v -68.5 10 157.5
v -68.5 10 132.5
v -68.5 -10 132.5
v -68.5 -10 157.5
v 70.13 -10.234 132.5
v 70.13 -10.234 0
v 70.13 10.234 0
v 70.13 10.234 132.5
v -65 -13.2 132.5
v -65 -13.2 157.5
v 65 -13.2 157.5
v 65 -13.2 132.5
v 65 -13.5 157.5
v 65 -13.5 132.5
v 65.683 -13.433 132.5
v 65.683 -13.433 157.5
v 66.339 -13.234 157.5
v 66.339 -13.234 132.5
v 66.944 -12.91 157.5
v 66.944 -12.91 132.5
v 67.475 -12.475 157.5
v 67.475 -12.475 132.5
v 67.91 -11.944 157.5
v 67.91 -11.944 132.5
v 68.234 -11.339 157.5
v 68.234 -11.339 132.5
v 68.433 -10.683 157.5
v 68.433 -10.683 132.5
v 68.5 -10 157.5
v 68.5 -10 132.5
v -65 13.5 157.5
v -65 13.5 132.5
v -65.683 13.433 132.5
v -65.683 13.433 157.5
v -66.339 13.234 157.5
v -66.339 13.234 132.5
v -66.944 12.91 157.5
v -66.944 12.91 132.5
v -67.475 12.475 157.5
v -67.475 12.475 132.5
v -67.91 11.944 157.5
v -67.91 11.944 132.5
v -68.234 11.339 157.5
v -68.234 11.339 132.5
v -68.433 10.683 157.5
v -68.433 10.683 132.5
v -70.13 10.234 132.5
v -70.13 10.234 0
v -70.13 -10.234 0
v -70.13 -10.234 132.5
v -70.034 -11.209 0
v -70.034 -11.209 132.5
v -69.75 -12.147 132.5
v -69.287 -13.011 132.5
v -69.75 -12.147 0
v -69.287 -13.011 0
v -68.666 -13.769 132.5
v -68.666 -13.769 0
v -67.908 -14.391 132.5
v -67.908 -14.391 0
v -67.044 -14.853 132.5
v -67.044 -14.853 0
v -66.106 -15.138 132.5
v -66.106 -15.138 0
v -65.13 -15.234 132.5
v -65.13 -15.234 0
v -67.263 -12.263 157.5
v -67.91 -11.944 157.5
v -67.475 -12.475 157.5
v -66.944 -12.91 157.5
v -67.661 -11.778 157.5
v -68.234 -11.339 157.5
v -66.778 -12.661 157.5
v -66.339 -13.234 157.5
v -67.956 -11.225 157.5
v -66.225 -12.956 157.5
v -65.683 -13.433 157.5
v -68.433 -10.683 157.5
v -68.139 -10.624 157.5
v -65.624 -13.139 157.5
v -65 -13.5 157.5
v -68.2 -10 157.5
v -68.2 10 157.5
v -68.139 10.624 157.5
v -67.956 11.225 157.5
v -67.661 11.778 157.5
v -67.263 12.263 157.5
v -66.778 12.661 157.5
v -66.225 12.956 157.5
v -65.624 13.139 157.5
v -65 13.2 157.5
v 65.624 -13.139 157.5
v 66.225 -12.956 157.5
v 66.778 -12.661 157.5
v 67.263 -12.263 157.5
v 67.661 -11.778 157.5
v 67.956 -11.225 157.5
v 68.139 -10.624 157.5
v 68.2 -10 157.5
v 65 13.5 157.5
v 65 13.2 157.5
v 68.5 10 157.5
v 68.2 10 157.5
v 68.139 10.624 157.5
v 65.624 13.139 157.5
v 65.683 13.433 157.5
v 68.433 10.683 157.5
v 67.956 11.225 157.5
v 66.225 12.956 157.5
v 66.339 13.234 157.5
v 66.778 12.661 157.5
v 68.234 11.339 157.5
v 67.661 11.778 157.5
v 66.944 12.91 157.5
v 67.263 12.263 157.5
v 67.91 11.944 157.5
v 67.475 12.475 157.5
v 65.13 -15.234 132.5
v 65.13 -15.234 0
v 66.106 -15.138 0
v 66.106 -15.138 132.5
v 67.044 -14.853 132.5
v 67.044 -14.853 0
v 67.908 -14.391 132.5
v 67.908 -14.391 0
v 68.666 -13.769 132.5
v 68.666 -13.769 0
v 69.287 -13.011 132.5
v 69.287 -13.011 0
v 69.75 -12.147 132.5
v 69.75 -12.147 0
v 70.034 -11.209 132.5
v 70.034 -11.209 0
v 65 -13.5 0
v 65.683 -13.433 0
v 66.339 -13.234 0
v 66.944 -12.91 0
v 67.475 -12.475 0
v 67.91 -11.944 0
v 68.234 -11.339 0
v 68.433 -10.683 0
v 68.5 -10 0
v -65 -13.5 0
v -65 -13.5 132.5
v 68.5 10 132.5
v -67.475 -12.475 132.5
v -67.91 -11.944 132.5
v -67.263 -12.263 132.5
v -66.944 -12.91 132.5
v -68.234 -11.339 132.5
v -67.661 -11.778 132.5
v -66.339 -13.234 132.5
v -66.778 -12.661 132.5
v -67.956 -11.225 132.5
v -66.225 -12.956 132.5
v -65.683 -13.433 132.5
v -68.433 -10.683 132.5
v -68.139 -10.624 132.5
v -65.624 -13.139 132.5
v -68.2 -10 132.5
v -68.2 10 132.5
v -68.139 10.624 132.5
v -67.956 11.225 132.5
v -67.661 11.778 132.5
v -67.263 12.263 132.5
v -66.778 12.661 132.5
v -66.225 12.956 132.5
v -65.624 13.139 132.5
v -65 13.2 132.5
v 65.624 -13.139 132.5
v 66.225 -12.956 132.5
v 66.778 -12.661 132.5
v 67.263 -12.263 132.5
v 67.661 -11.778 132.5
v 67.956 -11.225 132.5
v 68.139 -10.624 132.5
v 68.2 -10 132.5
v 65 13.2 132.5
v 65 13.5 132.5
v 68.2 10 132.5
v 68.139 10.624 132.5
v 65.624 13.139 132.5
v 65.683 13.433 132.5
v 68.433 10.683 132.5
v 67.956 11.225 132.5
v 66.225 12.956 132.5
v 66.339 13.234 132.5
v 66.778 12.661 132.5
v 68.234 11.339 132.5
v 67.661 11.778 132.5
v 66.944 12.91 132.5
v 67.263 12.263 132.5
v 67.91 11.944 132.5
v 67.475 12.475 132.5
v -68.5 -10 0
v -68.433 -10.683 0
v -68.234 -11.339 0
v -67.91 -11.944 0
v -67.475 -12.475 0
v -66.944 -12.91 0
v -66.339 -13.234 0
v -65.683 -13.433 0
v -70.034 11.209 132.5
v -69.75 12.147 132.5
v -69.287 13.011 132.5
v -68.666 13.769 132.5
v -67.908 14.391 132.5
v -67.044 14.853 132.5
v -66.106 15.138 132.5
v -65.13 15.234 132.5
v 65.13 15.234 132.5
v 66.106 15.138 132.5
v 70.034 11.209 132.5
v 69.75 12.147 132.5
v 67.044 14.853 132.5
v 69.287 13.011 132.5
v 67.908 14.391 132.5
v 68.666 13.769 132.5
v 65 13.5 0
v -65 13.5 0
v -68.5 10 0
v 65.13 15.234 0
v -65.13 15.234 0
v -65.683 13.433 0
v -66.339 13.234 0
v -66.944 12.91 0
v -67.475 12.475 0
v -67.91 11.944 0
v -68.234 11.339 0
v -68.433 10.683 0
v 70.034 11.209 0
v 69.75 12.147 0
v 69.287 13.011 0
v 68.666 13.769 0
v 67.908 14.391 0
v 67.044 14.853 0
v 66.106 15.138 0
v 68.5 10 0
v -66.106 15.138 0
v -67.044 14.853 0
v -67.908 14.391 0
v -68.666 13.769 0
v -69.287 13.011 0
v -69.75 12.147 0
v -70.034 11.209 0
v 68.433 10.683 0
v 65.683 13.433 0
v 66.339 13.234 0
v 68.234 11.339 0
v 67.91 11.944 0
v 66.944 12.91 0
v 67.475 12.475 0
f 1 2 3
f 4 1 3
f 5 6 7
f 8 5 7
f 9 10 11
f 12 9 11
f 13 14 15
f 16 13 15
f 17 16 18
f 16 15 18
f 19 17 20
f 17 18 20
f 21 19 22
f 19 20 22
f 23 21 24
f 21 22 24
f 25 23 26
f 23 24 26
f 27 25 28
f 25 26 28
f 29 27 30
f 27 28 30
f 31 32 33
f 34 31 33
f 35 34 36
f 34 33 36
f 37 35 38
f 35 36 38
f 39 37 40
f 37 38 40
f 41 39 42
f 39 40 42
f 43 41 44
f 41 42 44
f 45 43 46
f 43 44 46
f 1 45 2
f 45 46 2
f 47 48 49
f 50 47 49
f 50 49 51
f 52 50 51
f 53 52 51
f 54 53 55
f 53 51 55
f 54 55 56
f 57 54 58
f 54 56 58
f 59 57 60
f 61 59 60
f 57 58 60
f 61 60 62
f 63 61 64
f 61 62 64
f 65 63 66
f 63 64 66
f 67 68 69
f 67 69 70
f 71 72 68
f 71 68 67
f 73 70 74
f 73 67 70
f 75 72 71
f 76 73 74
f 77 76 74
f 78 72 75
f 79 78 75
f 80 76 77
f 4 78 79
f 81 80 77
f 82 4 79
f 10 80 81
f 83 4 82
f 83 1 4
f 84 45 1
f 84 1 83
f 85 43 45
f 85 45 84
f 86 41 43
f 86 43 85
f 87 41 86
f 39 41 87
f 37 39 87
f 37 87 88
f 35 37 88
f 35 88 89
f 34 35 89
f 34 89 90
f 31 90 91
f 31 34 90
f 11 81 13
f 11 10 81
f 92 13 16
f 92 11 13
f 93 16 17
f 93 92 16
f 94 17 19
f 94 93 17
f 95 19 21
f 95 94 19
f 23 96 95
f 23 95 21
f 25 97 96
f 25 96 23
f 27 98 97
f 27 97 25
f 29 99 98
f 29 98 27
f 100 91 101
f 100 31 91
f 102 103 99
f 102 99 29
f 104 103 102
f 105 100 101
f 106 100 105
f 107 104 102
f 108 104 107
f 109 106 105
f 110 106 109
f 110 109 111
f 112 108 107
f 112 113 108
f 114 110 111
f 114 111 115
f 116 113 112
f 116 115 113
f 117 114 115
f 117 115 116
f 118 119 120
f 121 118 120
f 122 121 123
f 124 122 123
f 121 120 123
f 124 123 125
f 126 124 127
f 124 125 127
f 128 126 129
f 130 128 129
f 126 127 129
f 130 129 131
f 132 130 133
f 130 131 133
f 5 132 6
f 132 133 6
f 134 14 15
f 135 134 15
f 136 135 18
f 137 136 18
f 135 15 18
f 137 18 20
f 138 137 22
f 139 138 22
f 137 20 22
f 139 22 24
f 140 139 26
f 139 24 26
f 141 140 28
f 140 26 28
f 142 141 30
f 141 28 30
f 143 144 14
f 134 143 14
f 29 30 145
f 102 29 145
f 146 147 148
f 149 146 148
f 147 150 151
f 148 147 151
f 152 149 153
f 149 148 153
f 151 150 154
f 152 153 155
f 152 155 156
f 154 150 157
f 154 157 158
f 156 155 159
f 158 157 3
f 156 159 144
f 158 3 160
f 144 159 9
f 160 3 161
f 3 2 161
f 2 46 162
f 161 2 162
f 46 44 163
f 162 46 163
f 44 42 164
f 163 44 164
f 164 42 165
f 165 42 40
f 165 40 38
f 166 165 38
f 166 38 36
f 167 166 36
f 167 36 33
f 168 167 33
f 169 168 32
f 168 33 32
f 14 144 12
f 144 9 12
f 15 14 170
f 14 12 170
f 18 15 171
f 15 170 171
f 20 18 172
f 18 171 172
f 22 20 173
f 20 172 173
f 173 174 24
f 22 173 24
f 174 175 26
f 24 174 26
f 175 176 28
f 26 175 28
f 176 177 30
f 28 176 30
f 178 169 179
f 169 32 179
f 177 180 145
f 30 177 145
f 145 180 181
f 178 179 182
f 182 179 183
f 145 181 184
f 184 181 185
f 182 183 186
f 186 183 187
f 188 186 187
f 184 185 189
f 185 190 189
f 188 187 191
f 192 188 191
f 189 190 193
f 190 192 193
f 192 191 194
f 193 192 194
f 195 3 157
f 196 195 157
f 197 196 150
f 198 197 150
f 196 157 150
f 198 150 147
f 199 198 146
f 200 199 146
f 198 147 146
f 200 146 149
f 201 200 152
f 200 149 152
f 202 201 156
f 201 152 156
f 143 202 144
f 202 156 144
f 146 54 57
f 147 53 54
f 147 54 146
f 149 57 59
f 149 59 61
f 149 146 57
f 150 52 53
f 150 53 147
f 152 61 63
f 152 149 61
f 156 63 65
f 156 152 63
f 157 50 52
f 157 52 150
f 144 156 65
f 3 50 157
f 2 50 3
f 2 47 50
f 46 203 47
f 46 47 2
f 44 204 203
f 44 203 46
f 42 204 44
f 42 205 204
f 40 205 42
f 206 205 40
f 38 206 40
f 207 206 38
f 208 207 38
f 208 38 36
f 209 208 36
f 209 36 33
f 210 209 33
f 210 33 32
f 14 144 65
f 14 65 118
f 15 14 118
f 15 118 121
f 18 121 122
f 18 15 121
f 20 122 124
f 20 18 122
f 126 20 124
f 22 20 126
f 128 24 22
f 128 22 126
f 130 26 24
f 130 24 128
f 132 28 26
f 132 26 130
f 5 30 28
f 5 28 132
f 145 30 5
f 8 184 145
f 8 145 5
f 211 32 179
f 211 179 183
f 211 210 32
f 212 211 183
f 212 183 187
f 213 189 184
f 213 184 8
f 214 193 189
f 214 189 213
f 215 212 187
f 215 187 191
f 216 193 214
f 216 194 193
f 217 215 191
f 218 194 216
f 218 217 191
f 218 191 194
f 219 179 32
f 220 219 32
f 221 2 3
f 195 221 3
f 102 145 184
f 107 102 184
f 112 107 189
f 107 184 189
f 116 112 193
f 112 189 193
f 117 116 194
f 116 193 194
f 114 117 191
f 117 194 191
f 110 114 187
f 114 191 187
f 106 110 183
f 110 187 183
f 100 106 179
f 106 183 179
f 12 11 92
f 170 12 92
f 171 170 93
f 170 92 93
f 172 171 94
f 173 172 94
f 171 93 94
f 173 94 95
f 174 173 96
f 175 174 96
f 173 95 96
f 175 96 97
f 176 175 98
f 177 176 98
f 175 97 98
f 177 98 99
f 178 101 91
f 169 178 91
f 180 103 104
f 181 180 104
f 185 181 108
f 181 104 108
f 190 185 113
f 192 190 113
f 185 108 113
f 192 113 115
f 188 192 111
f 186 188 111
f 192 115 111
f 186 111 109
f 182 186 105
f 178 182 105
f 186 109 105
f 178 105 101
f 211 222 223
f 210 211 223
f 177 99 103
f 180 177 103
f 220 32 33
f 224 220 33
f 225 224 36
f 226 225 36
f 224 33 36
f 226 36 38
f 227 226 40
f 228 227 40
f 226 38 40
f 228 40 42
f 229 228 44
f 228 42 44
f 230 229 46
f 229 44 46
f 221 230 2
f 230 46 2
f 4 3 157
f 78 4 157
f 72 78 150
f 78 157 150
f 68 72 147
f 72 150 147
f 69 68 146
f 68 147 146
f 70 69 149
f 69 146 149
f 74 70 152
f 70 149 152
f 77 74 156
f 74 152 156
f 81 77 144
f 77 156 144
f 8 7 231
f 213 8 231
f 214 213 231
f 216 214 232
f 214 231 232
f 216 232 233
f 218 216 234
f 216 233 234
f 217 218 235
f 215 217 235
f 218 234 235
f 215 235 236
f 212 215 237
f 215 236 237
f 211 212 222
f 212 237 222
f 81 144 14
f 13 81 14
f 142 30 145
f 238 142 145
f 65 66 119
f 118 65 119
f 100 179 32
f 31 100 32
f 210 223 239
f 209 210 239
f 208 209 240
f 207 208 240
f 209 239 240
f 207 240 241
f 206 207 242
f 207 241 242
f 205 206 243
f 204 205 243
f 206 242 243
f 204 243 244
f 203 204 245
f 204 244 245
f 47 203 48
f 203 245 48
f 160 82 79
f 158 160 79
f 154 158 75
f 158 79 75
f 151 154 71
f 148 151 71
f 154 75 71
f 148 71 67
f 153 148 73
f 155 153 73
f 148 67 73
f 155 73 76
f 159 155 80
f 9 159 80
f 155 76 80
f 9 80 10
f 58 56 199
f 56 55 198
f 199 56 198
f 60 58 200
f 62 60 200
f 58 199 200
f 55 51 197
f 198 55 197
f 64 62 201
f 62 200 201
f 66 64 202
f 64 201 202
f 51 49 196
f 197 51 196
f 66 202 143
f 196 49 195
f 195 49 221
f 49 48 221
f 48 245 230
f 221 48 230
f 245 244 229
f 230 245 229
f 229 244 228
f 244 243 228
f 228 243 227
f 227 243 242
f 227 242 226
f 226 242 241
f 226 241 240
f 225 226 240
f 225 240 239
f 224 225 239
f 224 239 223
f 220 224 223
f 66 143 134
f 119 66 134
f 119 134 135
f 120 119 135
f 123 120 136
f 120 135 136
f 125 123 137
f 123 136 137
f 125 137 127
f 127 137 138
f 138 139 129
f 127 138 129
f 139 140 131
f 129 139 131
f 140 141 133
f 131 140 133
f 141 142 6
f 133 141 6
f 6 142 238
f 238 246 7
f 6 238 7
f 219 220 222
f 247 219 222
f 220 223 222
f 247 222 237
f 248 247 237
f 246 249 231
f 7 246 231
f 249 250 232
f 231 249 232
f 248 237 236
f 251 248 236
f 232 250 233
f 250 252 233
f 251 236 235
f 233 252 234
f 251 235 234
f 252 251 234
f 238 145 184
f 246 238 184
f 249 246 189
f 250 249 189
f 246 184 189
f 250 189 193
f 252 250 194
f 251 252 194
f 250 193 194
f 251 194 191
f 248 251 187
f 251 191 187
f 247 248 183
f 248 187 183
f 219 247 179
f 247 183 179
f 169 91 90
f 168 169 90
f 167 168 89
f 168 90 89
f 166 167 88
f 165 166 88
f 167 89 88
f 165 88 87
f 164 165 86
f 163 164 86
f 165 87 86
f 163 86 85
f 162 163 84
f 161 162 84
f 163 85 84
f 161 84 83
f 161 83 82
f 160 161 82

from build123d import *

# Parameters (mm, degrees)
F1_DEPTH = 132.5
F3_DEPTH = 132.5
F4_DEPTH = 25
F6_DEPTH = 25


with BuildPart() as f1:
    # F0 (on Top) → F1 (new body)
    with BuildSketch(Plane.XY):
        with BuildLine():
            ThreePointArc((70.130132, 10.233636), (68.665666, 13.76917), (65.130132, 15.233636))
            Line((65.130132, 15.233636), (-65.130132, 15.233636))
            ThreePointArc((-65.130132, 15.233636), (-68.665666, 13.76917), (-70.130132, 10.233636))
            Line((-70.130132, 10.233636), (-70.130132, -10.233636))
            ThreePointArc((-70.130132, -10.233636), (-68.665666, -13.76917), (-65.130132, -15.233636))
            Line((-65.130132, -15.233636), (65.130132, -15.233636))
            ThreePointArc((65.130132, -15.233636), (68.665666, -13.76917), (70.130132, -10.233636))
            Line((70.130132, -10.233636), (70.130132, 10.233636))
        make_face()
    extrude(amount=F1_DEPTH)

    # F2 (on face) → F3 (cut, through all)
    with BuildSketch(Plane.XY.offset(132.5)):
        with BuildLine():
            Line((65, 13.5), (-65, 13.5))
            ThreePointArc((-65, 13.5), (-67.474874, 12.474874), (-68.5, 10))
            Line((-68.5, 10), (-68.5, -10))
            ThreePointArc((-68.5, -10), (-67.474874, -12.474874), (-65, -13.5))
            Line((-65, -13.5), (65, -13.5))
            ThreePointArc((65, -13.5), (67.474874, -12.474874), (68.5, -10))
            Line((68.5, -10), (68.5, 10))
            ThreePointArc((68.5, 10), (67.474874, 12.474874), (65, 13.5))
        make_face()
    extrude(amount=-F3_DEPTH, mode=Mode.SUBTRACT)


with BuildPart() as f4:
    # F2 (on face) → F4 (new body)
    with BuildSketch(Plane.XY.offset(132.5)):
        with BuildLine():
            Line((65, 13.5), (-65, 13.5))
            ThreePointArc((-65, 13.5), (-67.474874, 12.474874), (-68.5, 10))
            Line((-68.5, 10), (-68.5, -10))
            ThreePointArc((-68.5, -10), (-67.474874, -12.474874), (-65, -13.5))
            Line((-65, -13.5), (65, -13.5))
            ThreePointArc((65, -13.5), (67.474874, -12.474874), (68.5, -10))
            Line((68.5, -10), (68.5, 10))
            ThreePointArc((68.5, 10), (67.474874, 12.474874), (65, 13.5))
        make_face()
    extrude(amount=F4_DEPTH)

    # F5 (on face) → F6 (cut, through all)
    with BuildSketch(Plane.XY.offset(157.5)):
        with BuildLine():
            ThreePointArc((-65, 13.2), (-67.262742, 12.262742), (-68.2, 10))
            Line((-68.2, 10), (-68.2, -10))
            ThreePointArc((-68.2, -10), (-67.262742, -12.262742), (-65, -13.2))
            Line((-65, -13.2), (65, -13.2))
            ThreePointArc((65, -13.2), (67.262742, -12.262742), (68.2, -10))
            Line((68.2, -10), (68.2, 10))
            ThreePointArc((68.2, 10), (67.262742, 12.262742), (65, 13.2))
            Line((65, 13.2), (-65, 13.2))
        make_face()
    extrude(amount=-F6_DEPTH, mode=Mode.SUBTRACT)


solid = Compound([f1.part, f4.part])
